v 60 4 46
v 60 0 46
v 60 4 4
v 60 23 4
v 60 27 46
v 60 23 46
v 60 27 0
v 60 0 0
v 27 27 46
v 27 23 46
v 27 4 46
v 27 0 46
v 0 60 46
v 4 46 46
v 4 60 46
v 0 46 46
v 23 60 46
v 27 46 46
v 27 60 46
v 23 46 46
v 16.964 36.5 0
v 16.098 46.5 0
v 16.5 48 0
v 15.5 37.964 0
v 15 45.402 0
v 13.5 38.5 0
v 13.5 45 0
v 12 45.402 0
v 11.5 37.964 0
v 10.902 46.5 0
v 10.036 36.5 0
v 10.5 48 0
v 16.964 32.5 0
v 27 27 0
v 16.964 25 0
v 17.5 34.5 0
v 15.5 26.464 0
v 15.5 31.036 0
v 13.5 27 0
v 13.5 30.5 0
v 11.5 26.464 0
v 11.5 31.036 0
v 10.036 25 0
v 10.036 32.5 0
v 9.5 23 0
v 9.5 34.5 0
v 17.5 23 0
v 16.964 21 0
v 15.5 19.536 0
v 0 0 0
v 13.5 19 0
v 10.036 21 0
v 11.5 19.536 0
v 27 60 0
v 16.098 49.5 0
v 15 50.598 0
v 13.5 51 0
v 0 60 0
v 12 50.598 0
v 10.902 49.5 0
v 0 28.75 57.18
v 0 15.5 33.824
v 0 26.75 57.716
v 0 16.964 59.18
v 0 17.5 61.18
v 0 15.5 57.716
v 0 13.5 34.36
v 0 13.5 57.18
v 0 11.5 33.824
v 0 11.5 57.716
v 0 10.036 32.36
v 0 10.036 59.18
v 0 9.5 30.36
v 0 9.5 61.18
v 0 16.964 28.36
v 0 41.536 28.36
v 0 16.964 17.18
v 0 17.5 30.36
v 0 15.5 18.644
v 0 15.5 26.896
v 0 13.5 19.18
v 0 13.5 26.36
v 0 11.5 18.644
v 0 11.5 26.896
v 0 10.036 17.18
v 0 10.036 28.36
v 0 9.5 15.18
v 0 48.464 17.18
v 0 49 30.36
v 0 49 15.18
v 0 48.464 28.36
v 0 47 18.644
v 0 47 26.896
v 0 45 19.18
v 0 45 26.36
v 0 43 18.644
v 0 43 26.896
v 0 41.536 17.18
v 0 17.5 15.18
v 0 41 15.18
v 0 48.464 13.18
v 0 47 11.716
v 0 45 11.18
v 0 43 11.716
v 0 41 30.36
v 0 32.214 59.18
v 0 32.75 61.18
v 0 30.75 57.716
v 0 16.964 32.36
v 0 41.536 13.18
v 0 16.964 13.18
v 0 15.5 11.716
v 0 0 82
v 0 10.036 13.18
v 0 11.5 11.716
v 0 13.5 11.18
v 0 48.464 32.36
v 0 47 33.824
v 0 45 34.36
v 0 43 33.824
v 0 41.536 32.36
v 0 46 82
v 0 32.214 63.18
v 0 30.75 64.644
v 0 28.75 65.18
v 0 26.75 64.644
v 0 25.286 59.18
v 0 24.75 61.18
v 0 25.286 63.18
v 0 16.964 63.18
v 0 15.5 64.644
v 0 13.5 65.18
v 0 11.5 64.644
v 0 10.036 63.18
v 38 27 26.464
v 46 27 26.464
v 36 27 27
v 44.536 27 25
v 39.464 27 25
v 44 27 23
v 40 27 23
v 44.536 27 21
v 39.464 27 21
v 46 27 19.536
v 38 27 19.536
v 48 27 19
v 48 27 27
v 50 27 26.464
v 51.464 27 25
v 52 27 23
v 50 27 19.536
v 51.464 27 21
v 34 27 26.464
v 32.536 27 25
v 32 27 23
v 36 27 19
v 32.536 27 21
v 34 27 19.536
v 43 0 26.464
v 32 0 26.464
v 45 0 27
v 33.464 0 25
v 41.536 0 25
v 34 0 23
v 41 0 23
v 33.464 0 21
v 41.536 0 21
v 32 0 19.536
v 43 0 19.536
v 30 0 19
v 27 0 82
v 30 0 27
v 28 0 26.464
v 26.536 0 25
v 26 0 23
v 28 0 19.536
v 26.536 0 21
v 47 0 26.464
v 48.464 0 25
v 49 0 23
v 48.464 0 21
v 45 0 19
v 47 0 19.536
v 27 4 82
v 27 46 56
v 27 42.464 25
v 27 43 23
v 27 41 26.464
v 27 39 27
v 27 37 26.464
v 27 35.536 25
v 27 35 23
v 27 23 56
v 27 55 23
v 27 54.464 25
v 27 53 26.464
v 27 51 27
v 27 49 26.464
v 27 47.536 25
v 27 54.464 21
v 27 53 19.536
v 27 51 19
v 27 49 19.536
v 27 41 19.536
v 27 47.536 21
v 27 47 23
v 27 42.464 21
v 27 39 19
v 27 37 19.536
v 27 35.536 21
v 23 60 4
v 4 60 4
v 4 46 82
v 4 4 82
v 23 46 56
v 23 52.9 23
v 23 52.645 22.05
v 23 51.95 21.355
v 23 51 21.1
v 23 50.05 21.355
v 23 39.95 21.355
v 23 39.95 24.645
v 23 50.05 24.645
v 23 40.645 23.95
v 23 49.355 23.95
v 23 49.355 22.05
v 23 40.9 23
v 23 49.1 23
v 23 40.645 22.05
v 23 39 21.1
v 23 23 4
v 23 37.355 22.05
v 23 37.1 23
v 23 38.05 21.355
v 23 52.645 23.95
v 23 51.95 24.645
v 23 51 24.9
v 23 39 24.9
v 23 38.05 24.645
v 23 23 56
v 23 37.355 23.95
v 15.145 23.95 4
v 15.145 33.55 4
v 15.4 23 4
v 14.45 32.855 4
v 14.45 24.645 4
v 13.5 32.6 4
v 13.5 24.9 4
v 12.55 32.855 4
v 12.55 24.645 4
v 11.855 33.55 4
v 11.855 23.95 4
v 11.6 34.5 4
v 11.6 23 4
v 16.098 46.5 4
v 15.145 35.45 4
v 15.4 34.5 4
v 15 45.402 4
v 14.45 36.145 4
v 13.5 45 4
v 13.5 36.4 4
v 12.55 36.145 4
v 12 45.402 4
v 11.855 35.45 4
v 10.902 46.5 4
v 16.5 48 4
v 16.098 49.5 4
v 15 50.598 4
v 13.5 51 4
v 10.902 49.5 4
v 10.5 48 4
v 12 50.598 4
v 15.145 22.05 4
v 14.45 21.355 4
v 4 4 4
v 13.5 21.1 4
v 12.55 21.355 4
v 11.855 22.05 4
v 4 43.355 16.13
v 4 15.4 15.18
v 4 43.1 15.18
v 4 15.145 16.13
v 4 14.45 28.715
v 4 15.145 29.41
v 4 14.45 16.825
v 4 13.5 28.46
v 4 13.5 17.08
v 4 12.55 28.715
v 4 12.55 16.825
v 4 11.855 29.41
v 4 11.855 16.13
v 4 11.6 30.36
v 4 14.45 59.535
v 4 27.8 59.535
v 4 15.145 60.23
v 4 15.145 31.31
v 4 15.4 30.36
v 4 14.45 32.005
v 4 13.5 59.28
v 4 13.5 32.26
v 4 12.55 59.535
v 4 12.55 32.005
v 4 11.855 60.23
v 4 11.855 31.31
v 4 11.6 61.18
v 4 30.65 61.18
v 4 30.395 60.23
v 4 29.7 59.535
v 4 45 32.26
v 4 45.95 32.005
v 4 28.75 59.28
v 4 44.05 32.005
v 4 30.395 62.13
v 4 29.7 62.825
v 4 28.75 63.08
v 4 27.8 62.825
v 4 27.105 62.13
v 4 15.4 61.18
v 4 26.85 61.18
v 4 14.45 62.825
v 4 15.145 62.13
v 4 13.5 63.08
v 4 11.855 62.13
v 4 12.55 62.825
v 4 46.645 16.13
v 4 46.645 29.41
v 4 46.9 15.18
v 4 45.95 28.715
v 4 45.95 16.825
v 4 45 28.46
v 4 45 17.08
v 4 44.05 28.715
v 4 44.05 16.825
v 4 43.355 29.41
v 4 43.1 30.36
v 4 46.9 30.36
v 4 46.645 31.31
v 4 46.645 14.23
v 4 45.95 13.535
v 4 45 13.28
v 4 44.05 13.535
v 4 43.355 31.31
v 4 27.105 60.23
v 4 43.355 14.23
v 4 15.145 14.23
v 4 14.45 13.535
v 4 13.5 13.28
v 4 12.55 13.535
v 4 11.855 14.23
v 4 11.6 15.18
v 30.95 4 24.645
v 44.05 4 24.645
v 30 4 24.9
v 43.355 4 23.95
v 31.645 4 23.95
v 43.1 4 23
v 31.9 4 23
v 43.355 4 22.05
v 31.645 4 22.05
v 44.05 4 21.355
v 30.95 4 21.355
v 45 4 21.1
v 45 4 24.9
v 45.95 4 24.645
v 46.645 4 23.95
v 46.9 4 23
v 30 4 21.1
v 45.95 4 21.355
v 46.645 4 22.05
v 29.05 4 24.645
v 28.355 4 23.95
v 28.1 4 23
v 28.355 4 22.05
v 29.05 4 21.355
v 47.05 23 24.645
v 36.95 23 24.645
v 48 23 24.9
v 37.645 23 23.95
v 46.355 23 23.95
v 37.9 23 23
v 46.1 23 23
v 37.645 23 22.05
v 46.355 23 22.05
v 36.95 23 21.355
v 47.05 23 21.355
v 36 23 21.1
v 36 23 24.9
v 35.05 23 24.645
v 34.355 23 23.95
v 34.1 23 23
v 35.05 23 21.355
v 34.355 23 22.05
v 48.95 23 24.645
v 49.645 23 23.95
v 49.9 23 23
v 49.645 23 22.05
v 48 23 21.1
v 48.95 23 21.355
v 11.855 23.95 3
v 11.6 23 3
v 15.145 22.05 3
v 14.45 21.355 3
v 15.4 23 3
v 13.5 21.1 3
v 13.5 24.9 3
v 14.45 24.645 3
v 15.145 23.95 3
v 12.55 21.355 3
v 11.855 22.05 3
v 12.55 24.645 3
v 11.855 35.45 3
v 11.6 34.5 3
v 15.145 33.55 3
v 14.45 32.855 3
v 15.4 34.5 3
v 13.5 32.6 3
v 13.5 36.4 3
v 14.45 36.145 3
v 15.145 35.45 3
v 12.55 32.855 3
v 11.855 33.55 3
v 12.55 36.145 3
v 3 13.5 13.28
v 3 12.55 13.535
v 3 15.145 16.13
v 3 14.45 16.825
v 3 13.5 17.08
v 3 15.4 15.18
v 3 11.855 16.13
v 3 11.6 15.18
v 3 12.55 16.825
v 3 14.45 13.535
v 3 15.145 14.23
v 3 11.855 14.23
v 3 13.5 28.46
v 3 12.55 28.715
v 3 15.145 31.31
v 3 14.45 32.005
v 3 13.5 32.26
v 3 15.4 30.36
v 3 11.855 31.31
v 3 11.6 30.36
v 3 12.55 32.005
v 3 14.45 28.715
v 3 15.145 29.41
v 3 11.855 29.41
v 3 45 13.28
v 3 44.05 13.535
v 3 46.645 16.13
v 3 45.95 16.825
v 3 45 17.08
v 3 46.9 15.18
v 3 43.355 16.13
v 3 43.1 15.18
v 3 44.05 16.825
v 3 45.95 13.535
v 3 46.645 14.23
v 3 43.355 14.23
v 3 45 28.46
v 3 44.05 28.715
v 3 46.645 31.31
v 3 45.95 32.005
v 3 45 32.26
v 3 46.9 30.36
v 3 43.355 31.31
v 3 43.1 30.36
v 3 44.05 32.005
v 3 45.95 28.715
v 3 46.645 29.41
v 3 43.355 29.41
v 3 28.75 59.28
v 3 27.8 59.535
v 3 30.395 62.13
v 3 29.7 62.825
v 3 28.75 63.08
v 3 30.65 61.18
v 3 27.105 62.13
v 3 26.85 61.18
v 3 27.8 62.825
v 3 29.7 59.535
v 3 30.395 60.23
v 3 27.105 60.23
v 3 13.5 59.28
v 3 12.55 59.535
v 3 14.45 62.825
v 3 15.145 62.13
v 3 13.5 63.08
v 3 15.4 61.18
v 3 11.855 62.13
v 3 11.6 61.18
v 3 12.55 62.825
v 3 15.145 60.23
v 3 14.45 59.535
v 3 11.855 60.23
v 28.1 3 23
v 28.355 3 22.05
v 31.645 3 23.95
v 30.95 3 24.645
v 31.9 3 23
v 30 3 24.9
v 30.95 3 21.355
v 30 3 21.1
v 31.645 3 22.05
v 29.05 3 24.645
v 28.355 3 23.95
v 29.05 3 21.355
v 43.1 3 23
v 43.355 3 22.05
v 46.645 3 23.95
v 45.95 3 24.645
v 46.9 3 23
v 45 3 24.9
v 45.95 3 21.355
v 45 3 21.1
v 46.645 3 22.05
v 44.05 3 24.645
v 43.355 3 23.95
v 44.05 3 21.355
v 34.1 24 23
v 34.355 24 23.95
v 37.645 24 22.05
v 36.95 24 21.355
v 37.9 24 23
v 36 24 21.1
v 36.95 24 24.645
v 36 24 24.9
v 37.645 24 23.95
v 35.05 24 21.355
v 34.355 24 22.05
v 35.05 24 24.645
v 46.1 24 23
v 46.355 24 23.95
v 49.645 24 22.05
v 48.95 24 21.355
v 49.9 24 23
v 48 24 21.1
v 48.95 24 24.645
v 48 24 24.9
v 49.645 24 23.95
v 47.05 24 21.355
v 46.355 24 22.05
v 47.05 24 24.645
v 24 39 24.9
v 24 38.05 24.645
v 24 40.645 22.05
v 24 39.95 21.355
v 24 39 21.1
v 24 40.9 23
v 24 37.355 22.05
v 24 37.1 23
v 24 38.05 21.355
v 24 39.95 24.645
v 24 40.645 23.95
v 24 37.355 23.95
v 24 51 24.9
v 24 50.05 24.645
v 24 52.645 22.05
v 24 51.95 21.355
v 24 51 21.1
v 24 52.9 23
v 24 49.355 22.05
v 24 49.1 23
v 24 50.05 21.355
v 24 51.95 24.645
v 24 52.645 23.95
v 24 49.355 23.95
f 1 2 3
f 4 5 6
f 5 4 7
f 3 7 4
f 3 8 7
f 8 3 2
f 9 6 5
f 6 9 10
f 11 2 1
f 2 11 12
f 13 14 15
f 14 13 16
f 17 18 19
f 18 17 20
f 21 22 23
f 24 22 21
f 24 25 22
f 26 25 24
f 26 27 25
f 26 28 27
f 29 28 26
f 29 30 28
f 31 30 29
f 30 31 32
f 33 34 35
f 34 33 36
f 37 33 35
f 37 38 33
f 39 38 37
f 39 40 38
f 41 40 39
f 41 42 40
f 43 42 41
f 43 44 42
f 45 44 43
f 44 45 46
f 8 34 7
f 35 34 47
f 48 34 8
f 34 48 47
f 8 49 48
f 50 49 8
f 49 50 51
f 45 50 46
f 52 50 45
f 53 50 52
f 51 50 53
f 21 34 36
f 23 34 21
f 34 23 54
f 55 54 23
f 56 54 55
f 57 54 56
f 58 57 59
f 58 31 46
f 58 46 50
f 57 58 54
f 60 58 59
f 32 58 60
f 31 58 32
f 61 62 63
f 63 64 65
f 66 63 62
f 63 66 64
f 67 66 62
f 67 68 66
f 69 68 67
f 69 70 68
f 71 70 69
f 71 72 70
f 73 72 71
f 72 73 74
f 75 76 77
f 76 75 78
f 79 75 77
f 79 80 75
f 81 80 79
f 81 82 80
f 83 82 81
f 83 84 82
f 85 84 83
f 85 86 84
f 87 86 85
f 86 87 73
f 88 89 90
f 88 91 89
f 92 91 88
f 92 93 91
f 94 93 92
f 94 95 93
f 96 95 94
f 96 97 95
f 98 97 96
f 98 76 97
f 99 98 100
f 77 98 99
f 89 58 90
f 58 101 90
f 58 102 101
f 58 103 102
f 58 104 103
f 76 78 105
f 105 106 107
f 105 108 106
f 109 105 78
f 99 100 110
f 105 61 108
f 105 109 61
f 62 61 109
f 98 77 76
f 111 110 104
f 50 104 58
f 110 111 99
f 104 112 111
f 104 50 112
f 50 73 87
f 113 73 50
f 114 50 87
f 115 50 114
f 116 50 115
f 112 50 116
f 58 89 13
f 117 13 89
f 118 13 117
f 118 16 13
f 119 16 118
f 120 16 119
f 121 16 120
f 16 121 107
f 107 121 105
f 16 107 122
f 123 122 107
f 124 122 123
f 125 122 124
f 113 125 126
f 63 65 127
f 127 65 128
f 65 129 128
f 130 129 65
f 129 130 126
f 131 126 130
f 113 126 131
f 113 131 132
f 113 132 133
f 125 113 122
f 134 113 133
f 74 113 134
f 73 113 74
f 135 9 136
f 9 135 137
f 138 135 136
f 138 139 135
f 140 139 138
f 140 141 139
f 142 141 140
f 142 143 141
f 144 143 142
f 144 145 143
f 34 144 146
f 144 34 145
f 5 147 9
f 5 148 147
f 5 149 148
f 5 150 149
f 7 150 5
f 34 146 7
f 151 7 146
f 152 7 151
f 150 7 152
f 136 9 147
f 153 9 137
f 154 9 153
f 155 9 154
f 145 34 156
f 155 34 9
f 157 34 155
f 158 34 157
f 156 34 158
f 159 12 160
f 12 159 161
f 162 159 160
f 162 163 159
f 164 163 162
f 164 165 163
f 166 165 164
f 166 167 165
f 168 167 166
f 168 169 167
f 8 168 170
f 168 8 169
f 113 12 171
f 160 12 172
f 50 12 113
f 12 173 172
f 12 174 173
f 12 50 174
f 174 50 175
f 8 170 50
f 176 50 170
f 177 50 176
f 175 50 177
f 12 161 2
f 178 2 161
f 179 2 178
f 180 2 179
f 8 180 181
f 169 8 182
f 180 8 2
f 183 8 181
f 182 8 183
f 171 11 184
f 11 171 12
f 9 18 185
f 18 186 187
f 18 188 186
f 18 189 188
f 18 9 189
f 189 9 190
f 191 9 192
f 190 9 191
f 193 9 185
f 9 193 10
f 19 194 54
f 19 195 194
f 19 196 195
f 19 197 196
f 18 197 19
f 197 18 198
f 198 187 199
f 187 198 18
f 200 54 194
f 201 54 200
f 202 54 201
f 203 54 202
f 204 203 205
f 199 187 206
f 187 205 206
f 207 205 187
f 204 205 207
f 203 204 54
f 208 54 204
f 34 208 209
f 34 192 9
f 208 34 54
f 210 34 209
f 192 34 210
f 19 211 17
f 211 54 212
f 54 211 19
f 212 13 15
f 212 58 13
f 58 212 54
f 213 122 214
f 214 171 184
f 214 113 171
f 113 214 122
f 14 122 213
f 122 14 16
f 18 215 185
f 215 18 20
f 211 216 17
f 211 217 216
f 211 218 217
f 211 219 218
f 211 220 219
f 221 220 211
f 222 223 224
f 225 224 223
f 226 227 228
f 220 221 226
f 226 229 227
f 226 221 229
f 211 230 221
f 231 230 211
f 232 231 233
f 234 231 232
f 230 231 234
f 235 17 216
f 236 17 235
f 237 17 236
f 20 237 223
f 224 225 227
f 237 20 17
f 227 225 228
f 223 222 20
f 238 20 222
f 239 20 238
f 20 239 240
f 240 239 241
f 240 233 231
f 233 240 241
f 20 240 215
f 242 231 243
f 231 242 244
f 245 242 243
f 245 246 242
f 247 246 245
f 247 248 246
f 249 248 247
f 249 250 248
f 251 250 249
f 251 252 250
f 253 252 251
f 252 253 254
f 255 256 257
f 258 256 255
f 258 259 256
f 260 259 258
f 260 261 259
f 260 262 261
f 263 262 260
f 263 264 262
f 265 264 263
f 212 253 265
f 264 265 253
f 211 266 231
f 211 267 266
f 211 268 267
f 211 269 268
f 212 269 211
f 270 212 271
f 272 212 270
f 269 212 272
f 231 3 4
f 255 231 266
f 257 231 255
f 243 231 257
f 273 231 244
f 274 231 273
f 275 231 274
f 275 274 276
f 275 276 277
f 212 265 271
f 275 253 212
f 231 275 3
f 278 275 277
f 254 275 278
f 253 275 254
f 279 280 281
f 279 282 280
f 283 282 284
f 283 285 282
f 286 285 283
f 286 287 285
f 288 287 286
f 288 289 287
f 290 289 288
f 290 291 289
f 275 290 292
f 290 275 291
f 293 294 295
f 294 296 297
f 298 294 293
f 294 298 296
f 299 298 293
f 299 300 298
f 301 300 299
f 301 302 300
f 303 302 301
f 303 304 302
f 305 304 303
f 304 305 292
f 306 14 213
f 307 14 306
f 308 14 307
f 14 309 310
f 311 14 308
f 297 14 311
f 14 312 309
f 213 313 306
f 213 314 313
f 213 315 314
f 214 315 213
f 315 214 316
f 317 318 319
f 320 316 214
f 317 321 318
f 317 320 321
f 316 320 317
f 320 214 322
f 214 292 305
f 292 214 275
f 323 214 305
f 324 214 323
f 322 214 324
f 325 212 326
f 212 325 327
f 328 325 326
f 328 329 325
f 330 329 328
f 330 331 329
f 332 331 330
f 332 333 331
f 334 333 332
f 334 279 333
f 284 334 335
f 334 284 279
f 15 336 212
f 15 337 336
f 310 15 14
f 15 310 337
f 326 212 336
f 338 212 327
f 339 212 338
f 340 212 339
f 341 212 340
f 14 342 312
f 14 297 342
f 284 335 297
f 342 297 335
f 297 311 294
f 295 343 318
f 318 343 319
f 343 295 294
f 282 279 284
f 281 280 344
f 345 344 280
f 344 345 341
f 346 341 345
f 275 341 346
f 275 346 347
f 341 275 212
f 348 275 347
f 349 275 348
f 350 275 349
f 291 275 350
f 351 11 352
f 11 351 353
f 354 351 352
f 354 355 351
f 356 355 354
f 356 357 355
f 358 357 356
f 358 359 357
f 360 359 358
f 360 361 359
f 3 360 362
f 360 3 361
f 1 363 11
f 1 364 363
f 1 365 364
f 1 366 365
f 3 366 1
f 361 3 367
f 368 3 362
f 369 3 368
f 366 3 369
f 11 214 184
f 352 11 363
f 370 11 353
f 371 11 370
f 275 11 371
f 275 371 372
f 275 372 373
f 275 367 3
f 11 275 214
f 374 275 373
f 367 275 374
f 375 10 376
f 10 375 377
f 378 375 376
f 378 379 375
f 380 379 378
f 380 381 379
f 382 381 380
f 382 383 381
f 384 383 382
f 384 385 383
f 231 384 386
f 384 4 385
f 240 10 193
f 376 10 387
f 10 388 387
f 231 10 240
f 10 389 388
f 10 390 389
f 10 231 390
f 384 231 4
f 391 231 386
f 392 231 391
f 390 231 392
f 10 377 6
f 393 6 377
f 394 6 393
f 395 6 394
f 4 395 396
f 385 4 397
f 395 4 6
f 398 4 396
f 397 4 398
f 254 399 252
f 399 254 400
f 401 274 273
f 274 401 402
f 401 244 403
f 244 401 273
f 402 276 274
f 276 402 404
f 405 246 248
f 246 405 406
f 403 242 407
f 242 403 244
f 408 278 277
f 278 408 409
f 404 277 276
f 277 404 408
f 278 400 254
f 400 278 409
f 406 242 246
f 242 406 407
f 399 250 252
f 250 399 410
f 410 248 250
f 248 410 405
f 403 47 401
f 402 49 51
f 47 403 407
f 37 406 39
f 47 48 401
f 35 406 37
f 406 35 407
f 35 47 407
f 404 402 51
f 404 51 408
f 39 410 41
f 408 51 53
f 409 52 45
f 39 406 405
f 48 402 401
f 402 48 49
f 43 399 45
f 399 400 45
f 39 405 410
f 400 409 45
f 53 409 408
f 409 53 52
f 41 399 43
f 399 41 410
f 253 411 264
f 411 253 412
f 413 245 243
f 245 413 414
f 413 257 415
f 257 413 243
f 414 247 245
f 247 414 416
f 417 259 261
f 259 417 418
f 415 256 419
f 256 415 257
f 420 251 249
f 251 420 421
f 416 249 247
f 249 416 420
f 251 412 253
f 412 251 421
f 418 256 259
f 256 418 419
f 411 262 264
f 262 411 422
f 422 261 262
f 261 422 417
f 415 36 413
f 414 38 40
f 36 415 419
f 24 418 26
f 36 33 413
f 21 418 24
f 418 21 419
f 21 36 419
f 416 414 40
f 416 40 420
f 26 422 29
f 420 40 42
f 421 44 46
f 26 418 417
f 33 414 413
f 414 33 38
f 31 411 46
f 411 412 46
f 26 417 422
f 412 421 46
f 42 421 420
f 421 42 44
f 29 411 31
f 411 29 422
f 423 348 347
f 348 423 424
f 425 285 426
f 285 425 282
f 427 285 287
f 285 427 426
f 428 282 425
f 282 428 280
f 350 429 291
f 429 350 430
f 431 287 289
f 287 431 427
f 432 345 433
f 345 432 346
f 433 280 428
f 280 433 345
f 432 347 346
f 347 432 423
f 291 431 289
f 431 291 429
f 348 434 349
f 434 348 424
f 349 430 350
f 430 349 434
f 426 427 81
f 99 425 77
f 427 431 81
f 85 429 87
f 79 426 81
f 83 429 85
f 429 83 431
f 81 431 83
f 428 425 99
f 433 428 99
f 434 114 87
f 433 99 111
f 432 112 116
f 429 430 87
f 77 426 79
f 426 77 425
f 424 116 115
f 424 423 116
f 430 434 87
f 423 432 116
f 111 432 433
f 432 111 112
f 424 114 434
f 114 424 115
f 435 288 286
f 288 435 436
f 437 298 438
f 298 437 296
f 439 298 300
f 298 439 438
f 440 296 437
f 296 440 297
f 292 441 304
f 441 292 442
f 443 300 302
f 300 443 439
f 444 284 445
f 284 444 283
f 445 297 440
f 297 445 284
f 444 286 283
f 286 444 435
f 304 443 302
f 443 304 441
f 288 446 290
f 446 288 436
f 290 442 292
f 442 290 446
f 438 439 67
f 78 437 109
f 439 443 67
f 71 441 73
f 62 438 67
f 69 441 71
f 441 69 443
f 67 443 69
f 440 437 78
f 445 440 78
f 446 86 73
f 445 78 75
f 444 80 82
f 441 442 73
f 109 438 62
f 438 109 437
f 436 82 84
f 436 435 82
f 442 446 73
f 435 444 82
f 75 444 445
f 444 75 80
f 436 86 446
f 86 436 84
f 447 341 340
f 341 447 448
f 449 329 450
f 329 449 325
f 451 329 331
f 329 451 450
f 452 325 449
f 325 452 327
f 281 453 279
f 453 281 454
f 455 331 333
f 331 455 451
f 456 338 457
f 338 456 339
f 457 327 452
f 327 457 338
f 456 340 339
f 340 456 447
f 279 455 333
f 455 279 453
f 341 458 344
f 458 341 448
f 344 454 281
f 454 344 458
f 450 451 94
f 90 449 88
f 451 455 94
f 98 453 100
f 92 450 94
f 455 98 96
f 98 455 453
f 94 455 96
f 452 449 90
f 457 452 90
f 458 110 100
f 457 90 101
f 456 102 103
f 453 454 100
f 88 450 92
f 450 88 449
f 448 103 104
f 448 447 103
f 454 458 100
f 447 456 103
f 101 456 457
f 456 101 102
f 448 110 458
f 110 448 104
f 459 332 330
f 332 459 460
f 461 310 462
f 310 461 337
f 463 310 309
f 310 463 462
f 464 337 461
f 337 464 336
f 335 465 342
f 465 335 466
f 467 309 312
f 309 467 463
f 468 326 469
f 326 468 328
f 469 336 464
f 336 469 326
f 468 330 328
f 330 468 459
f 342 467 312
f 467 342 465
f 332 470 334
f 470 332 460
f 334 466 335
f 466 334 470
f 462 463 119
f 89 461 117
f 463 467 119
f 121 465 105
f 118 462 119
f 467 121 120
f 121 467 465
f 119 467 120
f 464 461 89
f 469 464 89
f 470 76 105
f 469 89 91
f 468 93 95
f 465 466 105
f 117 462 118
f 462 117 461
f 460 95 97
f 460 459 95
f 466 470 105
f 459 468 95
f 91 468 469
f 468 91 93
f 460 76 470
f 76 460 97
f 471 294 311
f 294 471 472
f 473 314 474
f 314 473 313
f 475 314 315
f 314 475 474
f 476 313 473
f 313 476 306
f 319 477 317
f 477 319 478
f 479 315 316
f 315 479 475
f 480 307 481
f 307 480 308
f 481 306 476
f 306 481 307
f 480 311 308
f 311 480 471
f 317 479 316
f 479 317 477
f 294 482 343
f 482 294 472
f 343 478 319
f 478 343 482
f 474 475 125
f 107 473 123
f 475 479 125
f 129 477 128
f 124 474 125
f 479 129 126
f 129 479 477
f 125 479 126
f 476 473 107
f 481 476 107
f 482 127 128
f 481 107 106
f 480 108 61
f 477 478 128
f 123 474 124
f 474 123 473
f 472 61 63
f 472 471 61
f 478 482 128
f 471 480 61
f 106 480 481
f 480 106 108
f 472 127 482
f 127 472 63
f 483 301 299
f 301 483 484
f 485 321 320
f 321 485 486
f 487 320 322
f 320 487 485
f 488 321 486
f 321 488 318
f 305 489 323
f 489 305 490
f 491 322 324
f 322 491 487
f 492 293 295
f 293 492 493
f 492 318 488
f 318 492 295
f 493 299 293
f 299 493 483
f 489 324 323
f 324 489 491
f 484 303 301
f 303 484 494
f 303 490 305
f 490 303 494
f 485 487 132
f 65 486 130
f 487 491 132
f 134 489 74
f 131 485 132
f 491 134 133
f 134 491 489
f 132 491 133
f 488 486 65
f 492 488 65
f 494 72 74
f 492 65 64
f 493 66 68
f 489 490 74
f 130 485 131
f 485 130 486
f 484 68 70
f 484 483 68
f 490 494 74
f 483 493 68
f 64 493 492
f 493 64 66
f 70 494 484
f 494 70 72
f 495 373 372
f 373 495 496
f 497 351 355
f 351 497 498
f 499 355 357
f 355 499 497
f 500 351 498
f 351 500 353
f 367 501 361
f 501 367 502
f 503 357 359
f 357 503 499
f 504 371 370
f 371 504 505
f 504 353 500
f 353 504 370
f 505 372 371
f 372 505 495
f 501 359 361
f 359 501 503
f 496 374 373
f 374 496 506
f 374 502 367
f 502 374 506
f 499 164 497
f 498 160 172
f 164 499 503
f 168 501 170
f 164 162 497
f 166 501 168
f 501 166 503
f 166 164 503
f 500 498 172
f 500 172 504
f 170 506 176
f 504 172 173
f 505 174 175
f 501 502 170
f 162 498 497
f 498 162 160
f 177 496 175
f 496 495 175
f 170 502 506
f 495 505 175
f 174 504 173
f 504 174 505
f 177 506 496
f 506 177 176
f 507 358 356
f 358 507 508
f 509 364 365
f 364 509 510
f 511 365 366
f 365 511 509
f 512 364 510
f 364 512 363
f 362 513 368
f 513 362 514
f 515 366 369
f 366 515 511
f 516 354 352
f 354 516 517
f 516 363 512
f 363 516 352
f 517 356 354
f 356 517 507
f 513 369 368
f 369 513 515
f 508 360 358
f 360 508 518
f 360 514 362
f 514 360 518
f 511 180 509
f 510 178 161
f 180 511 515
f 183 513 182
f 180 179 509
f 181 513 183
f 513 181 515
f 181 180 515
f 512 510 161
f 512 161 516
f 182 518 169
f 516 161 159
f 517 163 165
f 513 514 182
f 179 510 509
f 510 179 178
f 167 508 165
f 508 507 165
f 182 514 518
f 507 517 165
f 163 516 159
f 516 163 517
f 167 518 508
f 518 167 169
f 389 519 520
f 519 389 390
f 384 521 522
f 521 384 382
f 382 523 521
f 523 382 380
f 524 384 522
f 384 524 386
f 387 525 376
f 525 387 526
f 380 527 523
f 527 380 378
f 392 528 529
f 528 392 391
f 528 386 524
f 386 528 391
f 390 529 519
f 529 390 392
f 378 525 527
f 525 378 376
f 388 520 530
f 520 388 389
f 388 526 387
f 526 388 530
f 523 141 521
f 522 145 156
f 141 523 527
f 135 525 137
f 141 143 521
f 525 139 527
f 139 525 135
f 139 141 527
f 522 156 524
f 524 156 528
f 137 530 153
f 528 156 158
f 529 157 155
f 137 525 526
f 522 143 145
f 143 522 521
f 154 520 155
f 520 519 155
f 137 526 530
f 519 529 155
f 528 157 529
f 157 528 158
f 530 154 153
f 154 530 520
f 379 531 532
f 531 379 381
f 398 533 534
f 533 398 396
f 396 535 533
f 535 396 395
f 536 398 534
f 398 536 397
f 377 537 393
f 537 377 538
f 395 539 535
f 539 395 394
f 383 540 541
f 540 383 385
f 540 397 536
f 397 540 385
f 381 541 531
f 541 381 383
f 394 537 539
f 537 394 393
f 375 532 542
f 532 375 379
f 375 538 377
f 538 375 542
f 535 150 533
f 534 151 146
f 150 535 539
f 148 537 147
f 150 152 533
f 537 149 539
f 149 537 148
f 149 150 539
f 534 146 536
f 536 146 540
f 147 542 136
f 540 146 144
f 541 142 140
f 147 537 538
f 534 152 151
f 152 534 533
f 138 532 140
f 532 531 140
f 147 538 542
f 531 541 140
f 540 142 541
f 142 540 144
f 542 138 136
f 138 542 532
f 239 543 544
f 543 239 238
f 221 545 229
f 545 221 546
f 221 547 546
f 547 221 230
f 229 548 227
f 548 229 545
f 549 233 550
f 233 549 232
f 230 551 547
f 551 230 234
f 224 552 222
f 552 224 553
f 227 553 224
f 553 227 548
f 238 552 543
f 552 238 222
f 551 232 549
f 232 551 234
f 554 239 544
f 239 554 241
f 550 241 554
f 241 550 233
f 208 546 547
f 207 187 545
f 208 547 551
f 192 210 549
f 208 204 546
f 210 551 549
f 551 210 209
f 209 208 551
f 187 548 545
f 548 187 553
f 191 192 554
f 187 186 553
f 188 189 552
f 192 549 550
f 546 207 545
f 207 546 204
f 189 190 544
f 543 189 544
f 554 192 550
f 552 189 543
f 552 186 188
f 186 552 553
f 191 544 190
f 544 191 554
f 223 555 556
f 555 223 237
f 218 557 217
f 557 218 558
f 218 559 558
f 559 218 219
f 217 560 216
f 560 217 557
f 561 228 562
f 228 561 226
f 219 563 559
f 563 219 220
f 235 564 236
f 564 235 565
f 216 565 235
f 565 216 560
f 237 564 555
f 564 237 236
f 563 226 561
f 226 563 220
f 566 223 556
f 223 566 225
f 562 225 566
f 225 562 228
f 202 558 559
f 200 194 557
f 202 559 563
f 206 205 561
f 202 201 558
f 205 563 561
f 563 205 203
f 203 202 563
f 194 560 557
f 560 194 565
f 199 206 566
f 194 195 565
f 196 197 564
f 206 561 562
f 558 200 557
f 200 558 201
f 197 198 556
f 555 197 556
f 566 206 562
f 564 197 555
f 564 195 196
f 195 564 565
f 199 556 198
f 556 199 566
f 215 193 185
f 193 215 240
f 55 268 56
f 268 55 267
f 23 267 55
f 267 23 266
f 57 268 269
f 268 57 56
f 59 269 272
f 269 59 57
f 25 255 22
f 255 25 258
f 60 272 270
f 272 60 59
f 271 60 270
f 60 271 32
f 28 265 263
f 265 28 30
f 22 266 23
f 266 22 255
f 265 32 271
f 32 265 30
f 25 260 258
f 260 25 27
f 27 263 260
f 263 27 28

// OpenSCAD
difference(){
	union() {
		cube(size = [60, 27, 46]);
		cube(size = [27, 60, 46]);
		translate(v = [0, 0, 42]) {
			cube(size = [27, 46, 40]);
		}
		translate(v = [13.5000000000, 23.0000000000, 0]) {
			rotate(a = 180, v = [1, 0, 0]) {
			}
		}
		translate(v = [13.5000000000, 34.5000000000, 0]) {
			rotate(a = 180, v = [1, 0, 0]) {
			}
		}
		translate(v = [0, 13.5000000000, 15.1800000000]) {
			rotate(a = -90, v = [0, 1, 0]) {
			}
		}
		translate(v = [0, 13.5000000000, 30.3600000000]) {
			rotate(a = -90, v = [0, 1, 0]) {
			}
		}
		translate(v = [0, 45.0000000000, 15.1800000000]) {
			rotate(a = -90, v = [0, 1, 0]) {
			}
		}
		translate(v = [0, 45.0000000000, 30.3600000000]) {
			rotate(a = -90, v = [0, 1, 0]) {
			}
		}
		translate(v = [0, 28.7500000000, 61.1800000000]) {
			rotate(a = -90, v = [0, 1, 0]) {
			}
		}
		translate(v = [0, 13.5000000000, 61.1800000000]) {
			rotate(a = -90, v = [0, 1, 0]) {
			}
		}
		translate(v = [30.0000000000, 0, 23.0000000000]) {
			rotate(a = 90, v = [1, 0, 0]) {
			}
		}
		translate(v = [45.0000000000, 0, 23.0000000000]) {
			rotate(a = 90, v = [1, 0, 0]) {
			}
		}
		translate(v = [36.0000000000, 27, 23.0000000000]) {
			rotate(a = -90, v = [1, 0, 0]) {
			}
		}
		translate(v = [48.0000000000, 27, 23.0000000000]) {
			rotate(a = -90, v = [1, 0, 0]) {
			}
		}
		translate(v = [27, 39.0000000000, 23.0000000000]) {
			rotate(a = 90, v = [0, 1, 0]) {
			}
		}
		translate(v = [27, 51.0000000000, 23.0000000000]) {
			rotate(a = 90, v = [0, 1, 0]) {
			}
		}
		translate(v = [13.5000000000, 48.0000000000, -1]) {
		}
	}
	/* Holes Below*/
	union(){
		translate(v = [4, 4, 4]) {
			cube(size = [19, 60, 100]);
			cube(size = [60, 19, 100]);
		}
		translate(v = [4, 4, 56]) {
			cube(size = [50, 50, 50]);
		}
		translate(v = [13.5000000000, 23.0000000000, 0]){
			rotate(a = 180, v = [1, 0, 0]){
				union() {
					union() {
						translate(v = [0, 0, -5]) {
							cylinder($fn = 12, h = 5, r = 1.9000000000);
						}
						translate(v = [0, 0, -3]) {
							cylinder($fn = 12, h = 3, r1 = 1.9000000000, r2 = 4);
						}
					}
					cylinder($fn = 12, h = 1, r = 4);
				}
			}
		}
		translate(v = [13.5000000000, 34.5000000000, 0]){
			rotate(a = 180, v = [1, 0, 0]){
				union() {
					union() {
						translate(v = [0, 0, -5]) {
							cylinder($fn = 12, h = 5, r = 1.9000000000);
						}
						translate(v = [0, 0, -3]) {
							cylinder($fn = 12, h = 3, r1 = 1.9000000000, r2 = 4);
						}
					}
					cylinder($fn = 12, h = 1, r = 4);
				}
			}
		}
		translate(v = [0, 13.5000000000, 15.1800000000]){
			rotate(a = -90, v = [0, 1, 0]){
				union() {
					union() {
						translate(v = [0, 0, -5]) {
							cylinder($fn = 12, h = 5, r = 1.9000000000);
						}
						translate(v = [0, 0, -3]) {
							cylinder($fn = 12, h = 3, r1 = 1.9000000000, r2 = 4);
						}
					}
					cylinder($fn = 12, h = 1, r = 4);
				}
			}
		}
		translate(v = [0, 13.5000000000, 30.3600000000]){
			rotate(a = -90, v = [0, 1, 0]){
				union() {
					union() {
						translate(v = [0, 0, -5]) {
							cylinder($fn = 12, h = 5, r = 1.9000000000);
						}
						translate(v = [0, 0, -3]) {
							cylinder($fn = 12, h = 3, r1 = 1.9000000000, r2 = 4);
						}
					}
					cylinder($fn = 12, h = 1, r = 4);
				}
			}
		}
		translate(v = [0, 45.0000000000, 15.1800000000]){
			rotate(a = -90, v = [0, 1, 0]){
				union() {
					union() {
						translate(v = [0, 0, -5]) {
							cylinder($fn = 12, h = 5, r = 1.9000000000);
						}
						translate(v = [0, 0, -3]) {
							cylinder($fn = 12, h = 3, r1 = 1.9000000000, r2 = 4);
						}
					}
					cylinder($fn = 12, h = 1, r = 4);
				}
			}
		}
		translate(v = [0, 45.0000000000, 30.3600000000]){
			rotate(a = -90, v = [0, 1, 0]){
				union() {
					union() {
						translate(v = [0, 0, -5]) {
							cylinder($fn = 12, h = 5, r = 1.9000000000);
						}
						translate(v = [0, 0, -3]) {
							cylinder($fn = 12, h = 3, r1 = 1.9000000000, r2 = 4);
						}
					}
					cylinder($fn = 12, h = 1, r = 4);
				}
			}
		}
		translate(v = [0, 28.7500000000, 61.1800000000]){
			rotate(a = -90, v = [0, 1, 0]){
				union() {
					union() {
						translate(v = [0, 0, -5]) {
							cylinder($fn = 12, h = 5, r = 1.9000000000);
						}
						translate(v = [0, 0, -3]) {
							cylinder($fn = 12, h = 3, r1 = 1.9000000000, r2 = 4);
						}
					}
					cylinder($fn = 12, h = 1, r = 4);
				}
			}
		}
		translate(v = [0, 13.5000000000, 61.1800000000]){
			rotate(a = -90, v = [0, 1, 0]){
				union() {
					union() {
						translate(v = [0, 0, -5]) {
							cylinder($fn = 12, h = 5, r = 1.9000000000);
						}
						translate(v = [0, 0, -3]) {
							cylinder($fn = 12, h = 3, r1 = 1.9000000000, r2 = 4);
						}
					}
					cylinder($fn = 12, h = 1, r = 4);
				}
			}
		}
		translate(v = [30.0000000000, 0, 23.0000000000]){
			rotate(a = 90, v = [1, 0, 0]){
				union() {
					union() {
						translate(v = [0, 0, -5]) {
							cylinder($fn = 12, h = 5, r = 1.9000000000);
						}
						translate(v = [0, 0, -3]) {
							cylinder($fn = 12, h = 3, r1 = 1.9000000000, r2 = 4);
						}
					}
					cylinder($fn = 12, h = 1, r = 4);
				}
			}
		}
		translate(v = [45.0000000000, 0, 23.0000000000]){
			rotate(a = 90, v = [1, 0, 0]){
				union() {
					union() {
						translate(v = [0, 0, -5]) {
							cylinder($fn = 12, h = 5, r = 1.9000000000);
						}
						translate(v = [0, 0, -3]) {
							cylinder($fn = 12, h = 3, r1 = 1.9000000000, r2 = 4);
						}
					}
					cylinder($fn = 12, h = 1, r = 4);
				}
			}
		}
		translate(v = [36.0000000000, 27, 23.0000000000]){
			rotate(a = -90, v = [1, 0, 0]){
				union() {
					union() {
						translate(v = [0, 0, -5]) {
							cylinder($fn = 12, h = 5, r = 1.9000000000);
						}
						translate(v = [0, 0, -3]) {
							cylinder($fn = 12, h = 3, r1 = 1.9000000000, r2 = 4);
						}
					}
					cylinder($fn = 12, h = 1, r = 4);
				}
			}
		}
		translate(v = [48.0000000000, 27, 23.0000000000]){
			rotate(a = -90, v = [1, 0, 0]){
				union() {
					union() {
						translate(v = [0, 0, -5]) {
							cylinder($fn = 12, h = 5, r = 1.9000000000);
						}
						translate(v = [0, 0, -3]) {
							cylinder($fn = 12, h = 3, r1 = 1.9000000000, r2 = 4);
						}
					}
					cylinder($fn = 12, h = 1, r = 4);
				}
			}
		}
		translate(v = [27, 39.0000000000, 23.0000000000]){
			rotate(a = 90, v = [0, 1, 0]){
				union() {
					union() {
						translate(v = [0, 0, -5]) {
							cylinder($fn = 12, h = 5, r = 1.9000000000);
						}
						translate(v = [0, 0, -3]) {
							cylinder($fn = 12, h = 3, r1 = 1.9000000000, r2 = 4);
						}
					}
					cylinder($fn = 12, h = 1, r = 4);
				}
			}
		}
		translate(v = [27, 51.0000000000, 23.0000000000]){
			rotate(a = 90, v = [0, 1, 0]){
				union() {
					union() {
						translate(v = [0, 0, -5]) {
							cylinder($fn = 12, h = 5, r = 1.9000000000);
						}
						translate(v = [0, 0, -3]) {
							cylinder($fn = 12, h = 3, r1 = 1.9000000000, r2 = 4);
						}
					}
					cylinder($fn = 12, h = 1, r = 4);
				}
			}
		}
		translate(v = [13.5000000000, 48.0000000000, -1]){
			cylinder($fn = 12, h = 6, r = 3);
		}
	} /* End Holes */ 
}
